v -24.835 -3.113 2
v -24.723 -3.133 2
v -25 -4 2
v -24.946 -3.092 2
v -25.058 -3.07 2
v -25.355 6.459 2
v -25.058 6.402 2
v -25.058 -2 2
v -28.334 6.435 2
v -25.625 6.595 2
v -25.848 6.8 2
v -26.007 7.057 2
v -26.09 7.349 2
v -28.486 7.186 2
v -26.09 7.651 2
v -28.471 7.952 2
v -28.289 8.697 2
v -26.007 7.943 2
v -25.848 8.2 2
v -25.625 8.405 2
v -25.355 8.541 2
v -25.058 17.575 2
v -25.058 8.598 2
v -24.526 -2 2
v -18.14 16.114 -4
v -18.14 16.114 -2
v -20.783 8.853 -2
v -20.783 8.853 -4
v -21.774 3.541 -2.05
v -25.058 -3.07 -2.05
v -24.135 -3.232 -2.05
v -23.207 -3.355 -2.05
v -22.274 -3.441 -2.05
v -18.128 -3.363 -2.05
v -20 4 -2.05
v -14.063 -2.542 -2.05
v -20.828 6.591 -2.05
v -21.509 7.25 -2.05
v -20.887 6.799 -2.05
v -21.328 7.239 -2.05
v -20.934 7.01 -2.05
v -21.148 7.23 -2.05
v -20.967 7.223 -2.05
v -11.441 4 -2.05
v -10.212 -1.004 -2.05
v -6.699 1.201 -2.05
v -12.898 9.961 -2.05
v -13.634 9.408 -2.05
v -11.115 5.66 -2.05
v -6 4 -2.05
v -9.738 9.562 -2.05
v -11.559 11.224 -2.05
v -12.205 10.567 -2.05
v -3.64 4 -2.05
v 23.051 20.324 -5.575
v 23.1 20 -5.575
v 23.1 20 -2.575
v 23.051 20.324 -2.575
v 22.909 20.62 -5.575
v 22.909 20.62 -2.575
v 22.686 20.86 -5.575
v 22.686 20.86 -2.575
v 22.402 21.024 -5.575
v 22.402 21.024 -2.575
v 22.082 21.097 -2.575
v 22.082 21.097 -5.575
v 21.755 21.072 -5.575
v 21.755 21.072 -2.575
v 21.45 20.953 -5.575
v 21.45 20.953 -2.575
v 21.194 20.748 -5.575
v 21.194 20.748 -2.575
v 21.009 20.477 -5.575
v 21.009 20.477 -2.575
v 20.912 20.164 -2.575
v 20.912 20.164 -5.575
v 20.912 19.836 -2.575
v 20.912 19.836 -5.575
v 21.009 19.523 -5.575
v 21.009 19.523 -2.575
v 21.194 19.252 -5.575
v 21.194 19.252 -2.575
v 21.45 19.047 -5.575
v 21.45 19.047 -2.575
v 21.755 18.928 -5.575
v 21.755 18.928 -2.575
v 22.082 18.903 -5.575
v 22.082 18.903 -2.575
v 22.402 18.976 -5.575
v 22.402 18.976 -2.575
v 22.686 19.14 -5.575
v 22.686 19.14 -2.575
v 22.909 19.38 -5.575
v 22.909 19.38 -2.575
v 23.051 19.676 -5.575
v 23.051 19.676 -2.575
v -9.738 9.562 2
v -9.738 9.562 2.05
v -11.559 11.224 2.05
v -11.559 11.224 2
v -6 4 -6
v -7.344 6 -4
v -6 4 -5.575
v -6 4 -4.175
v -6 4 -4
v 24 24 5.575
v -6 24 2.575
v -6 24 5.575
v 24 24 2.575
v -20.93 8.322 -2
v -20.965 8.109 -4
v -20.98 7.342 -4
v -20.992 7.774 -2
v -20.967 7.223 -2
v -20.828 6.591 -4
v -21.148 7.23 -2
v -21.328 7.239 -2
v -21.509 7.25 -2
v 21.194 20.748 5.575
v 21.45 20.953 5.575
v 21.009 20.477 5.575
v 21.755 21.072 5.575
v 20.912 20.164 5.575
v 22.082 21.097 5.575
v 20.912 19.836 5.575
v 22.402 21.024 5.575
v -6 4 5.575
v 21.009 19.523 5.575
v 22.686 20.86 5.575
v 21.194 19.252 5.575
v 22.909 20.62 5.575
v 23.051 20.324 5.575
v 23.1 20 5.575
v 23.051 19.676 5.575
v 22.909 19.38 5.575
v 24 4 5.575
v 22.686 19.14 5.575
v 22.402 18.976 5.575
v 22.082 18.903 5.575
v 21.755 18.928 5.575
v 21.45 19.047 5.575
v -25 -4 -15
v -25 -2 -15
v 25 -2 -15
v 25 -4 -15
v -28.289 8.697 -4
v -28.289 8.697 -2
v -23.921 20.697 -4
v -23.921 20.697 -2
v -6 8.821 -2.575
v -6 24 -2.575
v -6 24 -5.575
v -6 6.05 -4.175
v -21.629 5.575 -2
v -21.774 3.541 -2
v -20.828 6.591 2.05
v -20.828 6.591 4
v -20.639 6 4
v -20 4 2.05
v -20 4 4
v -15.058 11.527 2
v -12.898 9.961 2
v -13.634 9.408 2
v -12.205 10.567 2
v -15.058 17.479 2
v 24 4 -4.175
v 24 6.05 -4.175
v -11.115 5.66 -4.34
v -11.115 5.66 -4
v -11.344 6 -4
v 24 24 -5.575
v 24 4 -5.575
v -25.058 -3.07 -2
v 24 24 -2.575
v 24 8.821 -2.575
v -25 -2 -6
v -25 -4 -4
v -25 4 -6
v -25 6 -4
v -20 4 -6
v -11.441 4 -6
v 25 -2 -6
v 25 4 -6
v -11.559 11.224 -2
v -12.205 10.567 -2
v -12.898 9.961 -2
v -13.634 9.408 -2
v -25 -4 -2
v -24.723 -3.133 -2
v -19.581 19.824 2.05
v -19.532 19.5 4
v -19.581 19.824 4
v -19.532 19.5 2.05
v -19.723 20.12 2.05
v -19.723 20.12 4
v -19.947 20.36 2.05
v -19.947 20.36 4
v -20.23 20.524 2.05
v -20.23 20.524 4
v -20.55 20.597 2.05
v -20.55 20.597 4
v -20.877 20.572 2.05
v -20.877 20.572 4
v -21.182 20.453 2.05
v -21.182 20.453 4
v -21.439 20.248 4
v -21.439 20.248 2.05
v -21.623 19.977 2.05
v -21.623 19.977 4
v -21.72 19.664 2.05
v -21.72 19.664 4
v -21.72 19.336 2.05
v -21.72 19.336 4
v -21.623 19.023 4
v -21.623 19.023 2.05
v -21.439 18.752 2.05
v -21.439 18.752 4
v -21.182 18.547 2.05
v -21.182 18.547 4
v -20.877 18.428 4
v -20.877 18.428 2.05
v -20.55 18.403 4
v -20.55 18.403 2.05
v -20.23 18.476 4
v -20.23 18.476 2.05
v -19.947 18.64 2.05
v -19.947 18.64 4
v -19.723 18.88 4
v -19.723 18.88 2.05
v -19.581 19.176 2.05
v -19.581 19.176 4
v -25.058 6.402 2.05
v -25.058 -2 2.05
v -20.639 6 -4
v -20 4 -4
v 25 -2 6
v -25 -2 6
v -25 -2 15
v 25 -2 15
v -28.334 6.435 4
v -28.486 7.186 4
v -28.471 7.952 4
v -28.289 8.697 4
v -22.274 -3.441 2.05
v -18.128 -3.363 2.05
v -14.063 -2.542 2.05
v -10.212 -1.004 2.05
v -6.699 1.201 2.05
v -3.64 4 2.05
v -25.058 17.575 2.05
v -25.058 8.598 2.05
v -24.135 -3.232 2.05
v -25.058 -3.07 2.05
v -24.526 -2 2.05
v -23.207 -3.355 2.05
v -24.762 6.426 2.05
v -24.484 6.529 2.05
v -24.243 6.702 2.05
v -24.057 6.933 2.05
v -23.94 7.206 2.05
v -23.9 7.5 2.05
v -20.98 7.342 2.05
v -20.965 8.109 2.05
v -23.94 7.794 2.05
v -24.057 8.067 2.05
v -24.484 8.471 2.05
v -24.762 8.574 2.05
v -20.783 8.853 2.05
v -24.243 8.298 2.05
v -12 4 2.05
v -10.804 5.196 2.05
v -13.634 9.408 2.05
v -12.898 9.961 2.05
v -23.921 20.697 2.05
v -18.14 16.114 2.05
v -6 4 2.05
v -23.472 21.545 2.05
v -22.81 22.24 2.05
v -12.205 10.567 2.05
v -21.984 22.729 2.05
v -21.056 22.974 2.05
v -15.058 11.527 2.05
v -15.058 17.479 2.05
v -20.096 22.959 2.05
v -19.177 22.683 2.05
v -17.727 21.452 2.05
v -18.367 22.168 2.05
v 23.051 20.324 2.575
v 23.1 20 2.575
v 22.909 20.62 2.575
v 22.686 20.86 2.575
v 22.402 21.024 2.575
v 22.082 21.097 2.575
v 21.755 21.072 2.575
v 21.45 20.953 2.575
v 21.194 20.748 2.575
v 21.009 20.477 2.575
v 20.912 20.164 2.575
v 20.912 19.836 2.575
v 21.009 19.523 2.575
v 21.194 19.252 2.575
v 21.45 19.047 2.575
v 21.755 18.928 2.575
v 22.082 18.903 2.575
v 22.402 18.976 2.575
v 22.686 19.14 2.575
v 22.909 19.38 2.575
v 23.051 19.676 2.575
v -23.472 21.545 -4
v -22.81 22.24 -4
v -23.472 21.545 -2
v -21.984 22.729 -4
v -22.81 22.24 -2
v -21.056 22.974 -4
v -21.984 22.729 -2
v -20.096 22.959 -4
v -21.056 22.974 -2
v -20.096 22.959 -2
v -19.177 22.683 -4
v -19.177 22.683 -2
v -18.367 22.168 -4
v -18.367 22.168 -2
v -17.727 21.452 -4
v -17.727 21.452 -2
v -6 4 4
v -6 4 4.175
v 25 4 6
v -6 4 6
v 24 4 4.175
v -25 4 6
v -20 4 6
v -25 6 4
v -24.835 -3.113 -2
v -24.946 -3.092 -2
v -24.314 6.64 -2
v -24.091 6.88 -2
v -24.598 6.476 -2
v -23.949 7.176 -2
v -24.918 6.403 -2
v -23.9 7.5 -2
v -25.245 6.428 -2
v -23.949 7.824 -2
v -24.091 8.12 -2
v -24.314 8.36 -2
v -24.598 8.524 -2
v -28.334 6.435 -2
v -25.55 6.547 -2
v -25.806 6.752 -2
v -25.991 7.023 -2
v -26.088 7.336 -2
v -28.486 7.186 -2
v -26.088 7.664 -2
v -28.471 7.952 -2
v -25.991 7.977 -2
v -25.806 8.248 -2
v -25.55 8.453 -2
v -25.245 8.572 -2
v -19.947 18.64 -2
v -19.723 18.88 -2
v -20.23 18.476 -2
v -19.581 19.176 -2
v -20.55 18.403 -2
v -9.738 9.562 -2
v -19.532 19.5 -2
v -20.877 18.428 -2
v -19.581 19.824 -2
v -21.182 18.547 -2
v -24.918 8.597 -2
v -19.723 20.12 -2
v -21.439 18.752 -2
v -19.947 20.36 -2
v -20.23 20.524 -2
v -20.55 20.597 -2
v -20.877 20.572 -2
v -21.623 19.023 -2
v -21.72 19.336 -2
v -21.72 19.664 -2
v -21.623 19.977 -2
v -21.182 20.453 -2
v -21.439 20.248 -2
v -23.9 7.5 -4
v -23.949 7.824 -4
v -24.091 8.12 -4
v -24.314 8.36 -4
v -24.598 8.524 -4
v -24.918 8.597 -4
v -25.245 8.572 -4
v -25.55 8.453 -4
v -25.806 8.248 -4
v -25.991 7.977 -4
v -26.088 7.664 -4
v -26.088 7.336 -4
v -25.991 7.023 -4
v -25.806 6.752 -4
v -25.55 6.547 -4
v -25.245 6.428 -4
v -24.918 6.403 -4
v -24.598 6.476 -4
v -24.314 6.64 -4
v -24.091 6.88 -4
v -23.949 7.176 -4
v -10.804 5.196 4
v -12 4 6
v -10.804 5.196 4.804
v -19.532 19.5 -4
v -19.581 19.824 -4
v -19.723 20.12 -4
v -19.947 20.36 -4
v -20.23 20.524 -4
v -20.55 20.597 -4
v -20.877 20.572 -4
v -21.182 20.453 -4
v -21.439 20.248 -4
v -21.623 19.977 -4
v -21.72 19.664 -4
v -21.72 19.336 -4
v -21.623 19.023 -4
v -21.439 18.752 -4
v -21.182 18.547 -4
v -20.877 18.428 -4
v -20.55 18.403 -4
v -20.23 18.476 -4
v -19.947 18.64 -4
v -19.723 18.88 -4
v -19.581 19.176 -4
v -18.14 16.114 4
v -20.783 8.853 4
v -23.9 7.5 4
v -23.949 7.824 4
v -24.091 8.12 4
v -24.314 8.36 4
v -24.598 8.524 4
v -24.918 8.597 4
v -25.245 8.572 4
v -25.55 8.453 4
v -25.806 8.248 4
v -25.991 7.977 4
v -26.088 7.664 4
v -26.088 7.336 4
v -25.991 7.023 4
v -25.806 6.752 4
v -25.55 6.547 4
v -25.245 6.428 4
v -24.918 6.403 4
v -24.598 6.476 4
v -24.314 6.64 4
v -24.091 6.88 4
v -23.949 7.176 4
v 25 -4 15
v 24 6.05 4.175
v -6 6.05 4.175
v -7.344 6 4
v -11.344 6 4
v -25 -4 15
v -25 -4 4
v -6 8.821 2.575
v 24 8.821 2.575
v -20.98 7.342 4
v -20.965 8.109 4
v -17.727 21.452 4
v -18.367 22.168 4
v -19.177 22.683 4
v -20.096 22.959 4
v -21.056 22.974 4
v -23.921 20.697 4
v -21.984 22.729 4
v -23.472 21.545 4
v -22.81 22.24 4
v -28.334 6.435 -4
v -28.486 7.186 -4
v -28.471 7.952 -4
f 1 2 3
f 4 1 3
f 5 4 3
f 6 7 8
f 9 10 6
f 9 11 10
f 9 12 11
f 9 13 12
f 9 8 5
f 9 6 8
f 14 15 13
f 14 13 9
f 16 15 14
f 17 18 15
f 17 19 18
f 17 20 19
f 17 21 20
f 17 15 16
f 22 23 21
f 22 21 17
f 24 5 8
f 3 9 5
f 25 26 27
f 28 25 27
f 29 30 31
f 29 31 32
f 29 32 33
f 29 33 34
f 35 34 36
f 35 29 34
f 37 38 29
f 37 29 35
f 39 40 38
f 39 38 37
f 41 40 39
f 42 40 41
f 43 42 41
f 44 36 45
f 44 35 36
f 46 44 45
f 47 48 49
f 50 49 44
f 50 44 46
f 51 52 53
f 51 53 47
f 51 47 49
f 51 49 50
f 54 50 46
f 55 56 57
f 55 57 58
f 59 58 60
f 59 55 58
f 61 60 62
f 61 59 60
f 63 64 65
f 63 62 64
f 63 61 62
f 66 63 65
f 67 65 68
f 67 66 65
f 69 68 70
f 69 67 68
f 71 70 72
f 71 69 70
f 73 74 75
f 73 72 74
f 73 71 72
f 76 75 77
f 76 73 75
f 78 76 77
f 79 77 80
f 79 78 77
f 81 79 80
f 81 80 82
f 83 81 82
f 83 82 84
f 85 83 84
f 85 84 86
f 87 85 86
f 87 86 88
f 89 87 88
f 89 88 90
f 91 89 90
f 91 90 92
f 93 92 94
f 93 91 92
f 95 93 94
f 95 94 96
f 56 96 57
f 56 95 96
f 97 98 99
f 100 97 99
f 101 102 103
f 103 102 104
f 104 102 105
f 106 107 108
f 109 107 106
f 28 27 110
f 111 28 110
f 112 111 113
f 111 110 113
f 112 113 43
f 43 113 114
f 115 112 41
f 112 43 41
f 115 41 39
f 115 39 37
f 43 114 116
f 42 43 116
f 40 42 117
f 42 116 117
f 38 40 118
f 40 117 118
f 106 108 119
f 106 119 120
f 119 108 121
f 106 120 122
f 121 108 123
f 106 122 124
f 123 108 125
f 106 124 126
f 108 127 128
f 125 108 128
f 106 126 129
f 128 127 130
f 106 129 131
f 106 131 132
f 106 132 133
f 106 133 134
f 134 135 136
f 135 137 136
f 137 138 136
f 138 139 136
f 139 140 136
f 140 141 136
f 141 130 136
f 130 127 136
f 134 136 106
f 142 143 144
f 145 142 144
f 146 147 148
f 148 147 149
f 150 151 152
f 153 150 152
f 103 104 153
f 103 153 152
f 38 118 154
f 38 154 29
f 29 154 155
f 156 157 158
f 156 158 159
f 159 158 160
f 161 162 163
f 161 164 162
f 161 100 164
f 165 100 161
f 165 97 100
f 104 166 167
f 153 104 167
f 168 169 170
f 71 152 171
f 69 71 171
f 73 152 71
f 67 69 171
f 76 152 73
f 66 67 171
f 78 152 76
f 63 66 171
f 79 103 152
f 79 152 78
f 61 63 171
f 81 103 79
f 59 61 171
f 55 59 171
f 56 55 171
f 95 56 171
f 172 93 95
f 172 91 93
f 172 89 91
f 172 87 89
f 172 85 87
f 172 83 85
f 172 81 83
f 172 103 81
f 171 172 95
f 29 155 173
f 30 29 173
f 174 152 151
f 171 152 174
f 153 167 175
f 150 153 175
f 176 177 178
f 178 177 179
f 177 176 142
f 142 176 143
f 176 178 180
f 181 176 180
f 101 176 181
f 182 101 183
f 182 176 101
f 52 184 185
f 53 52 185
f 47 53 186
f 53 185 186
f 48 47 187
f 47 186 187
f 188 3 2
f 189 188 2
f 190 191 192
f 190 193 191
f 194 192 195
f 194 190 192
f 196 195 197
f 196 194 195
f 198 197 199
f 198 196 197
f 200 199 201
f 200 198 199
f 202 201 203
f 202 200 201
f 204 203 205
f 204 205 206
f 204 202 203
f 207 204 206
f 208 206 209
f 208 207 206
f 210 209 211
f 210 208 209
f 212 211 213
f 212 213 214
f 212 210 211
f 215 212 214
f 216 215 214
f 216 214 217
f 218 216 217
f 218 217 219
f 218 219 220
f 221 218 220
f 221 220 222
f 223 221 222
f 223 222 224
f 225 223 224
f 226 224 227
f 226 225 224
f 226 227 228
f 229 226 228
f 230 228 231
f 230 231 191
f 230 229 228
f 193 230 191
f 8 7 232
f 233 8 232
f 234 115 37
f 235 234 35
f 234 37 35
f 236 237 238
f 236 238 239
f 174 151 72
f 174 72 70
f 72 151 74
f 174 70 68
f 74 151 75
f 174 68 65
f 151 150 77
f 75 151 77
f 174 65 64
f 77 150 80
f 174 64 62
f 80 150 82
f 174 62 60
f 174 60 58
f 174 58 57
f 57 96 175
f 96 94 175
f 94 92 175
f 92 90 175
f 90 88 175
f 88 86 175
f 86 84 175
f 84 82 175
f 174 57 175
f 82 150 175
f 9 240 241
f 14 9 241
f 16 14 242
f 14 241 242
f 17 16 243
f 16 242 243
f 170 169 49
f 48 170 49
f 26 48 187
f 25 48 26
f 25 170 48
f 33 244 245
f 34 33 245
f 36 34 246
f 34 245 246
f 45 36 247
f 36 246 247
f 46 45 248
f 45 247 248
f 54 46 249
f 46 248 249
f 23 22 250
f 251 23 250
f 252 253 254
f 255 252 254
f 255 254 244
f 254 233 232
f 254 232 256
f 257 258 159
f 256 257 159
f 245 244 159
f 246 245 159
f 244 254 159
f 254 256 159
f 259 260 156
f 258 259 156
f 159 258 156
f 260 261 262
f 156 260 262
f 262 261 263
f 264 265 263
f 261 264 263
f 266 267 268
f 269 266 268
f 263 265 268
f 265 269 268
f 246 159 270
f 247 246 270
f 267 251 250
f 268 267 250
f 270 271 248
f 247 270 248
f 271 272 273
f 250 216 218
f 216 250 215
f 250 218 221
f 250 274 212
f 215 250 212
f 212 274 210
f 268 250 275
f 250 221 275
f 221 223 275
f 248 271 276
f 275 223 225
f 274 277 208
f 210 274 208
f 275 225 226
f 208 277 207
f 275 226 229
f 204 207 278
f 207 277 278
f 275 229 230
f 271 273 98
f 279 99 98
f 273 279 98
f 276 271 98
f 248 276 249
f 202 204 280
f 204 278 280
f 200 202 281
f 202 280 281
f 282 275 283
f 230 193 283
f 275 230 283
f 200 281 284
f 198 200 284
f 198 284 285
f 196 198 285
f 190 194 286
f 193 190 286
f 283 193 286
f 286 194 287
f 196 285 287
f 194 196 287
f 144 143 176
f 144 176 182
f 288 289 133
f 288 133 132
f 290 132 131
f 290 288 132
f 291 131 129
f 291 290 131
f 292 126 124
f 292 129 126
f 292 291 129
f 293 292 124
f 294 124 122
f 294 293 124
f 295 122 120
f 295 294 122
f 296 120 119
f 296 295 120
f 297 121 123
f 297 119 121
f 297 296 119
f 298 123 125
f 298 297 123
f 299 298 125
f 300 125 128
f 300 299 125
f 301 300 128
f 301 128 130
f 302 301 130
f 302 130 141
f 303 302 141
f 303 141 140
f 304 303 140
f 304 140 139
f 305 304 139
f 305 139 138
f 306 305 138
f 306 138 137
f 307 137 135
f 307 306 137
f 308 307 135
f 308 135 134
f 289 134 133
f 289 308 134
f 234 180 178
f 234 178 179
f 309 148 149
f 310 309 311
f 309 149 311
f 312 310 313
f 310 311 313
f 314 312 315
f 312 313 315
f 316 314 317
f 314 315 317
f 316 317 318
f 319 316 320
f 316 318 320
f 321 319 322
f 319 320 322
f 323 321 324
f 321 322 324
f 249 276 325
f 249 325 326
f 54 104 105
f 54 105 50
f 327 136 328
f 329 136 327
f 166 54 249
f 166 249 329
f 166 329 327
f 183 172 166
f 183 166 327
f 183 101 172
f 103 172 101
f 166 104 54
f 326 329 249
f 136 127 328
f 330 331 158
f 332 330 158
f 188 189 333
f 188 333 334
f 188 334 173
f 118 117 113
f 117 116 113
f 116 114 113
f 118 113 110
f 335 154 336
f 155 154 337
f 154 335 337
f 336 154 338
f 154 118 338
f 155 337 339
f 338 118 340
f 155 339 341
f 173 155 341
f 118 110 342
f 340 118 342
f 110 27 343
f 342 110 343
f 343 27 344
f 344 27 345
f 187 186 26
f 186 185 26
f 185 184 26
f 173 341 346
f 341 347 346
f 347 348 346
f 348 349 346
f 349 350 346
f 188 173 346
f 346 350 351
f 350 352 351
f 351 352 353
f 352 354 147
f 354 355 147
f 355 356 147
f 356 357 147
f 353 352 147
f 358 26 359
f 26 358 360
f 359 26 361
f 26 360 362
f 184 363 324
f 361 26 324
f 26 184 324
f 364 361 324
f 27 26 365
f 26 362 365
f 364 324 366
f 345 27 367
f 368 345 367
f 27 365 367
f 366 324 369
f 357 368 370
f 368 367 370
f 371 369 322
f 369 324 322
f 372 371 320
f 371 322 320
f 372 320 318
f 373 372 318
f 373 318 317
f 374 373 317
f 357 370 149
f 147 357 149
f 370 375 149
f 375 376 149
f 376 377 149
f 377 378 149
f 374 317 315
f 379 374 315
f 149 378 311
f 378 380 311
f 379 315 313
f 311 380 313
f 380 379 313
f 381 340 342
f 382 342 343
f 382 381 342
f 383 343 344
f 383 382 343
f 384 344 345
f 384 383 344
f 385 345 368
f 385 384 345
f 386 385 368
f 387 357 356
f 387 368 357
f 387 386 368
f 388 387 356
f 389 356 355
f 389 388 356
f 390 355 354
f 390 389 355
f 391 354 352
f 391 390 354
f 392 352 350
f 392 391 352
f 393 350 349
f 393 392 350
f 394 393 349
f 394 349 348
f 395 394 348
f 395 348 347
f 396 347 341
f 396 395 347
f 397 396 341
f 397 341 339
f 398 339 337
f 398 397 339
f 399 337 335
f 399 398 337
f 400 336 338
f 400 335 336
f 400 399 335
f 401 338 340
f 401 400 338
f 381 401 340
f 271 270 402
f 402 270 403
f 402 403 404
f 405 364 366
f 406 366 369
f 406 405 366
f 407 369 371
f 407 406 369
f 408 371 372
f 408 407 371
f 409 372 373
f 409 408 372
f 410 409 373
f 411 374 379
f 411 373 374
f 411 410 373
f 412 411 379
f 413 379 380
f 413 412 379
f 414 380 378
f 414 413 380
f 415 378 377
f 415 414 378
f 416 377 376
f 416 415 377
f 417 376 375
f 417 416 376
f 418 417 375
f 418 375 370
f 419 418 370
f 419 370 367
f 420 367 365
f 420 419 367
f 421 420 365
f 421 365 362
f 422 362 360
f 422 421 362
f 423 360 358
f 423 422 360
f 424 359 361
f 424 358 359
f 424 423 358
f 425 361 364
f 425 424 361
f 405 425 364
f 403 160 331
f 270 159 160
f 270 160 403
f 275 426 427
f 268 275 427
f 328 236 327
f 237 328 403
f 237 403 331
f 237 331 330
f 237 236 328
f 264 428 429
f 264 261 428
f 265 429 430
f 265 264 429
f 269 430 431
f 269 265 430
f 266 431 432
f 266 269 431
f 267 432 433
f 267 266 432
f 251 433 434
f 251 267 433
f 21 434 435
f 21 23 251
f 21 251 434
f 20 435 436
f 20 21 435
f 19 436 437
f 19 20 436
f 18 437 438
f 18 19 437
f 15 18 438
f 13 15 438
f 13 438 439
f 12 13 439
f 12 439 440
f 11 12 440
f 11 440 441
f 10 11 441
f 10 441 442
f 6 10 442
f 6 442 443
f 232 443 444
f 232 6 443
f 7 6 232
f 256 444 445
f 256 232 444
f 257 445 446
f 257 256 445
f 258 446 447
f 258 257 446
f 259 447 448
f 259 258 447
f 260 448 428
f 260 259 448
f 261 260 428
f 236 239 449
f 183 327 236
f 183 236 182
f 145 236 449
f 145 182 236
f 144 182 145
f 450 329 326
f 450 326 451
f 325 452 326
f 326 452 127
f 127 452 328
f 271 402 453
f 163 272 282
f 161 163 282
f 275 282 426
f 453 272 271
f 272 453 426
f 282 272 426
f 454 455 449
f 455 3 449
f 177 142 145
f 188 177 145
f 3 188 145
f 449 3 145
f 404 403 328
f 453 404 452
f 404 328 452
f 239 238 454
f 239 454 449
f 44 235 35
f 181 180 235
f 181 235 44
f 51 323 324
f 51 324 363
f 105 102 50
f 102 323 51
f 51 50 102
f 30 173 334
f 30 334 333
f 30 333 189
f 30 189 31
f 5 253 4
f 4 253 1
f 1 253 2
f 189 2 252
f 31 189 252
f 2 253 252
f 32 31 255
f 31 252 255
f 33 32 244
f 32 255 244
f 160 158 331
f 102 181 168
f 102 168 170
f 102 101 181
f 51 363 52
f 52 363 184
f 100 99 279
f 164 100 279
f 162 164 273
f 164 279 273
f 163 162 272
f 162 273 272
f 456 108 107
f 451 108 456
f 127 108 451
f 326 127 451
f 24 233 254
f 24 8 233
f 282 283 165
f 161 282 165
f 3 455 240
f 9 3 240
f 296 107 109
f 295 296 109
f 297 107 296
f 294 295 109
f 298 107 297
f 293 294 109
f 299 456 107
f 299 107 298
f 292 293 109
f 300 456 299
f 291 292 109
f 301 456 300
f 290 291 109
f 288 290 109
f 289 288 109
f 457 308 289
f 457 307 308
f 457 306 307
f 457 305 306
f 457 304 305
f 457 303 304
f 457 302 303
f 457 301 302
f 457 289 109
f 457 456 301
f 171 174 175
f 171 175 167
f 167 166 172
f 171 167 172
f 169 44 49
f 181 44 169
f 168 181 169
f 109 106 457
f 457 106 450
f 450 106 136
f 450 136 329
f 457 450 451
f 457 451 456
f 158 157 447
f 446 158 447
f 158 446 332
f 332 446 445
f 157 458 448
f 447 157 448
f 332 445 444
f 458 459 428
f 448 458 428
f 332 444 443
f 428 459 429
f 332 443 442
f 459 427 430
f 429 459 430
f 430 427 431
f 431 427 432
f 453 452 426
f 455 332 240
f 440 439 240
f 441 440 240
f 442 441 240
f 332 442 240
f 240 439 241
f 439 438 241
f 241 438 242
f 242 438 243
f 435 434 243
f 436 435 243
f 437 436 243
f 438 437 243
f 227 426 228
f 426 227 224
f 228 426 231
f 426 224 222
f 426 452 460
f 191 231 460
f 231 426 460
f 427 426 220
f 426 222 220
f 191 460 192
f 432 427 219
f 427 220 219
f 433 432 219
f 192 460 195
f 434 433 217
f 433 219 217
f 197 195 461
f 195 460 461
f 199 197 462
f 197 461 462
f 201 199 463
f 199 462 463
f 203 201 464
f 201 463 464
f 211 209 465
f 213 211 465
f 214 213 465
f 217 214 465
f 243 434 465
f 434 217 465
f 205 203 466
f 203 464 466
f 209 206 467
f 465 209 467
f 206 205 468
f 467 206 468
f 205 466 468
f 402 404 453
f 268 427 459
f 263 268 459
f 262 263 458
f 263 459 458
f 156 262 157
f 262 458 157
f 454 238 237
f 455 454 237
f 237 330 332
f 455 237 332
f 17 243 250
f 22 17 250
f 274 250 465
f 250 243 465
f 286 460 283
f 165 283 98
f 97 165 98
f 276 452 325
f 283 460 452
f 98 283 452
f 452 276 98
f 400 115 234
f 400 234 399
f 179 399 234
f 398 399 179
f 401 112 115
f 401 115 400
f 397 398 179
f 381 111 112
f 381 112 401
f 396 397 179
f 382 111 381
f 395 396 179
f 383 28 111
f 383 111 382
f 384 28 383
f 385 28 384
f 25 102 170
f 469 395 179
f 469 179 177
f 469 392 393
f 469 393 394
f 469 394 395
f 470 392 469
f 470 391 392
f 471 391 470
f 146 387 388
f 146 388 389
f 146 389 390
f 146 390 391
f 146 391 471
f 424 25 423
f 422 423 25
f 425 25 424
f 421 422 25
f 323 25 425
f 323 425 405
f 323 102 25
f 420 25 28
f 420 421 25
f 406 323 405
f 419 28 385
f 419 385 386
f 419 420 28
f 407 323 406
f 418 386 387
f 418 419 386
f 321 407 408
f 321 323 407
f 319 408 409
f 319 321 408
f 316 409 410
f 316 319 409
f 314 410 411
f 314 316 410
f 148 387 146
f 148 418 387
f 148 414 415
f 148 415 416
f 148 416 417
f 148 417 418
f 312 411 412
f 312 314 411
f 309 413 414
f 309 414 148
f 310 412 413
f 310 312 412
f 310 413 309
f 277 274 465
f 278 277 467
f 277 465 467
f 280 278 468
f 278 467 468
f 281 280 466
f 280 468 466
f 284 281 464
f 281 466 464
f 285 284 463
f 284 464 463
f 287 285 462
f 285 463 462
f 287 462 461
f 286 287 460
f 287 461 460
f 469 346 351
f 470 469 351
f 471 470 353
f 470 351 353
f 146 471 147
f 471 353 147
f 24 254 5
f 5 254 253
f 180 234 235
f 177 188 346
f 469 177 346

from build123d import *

# Parameters (mm, degrees)
SKETCH_1_W               = 50
SKETCH_1_H               = 30
EXTRUDE_1_DEPTH          = 4
SKETCH_2_R               = 1.1
EXTRUDE_2_DEPTH          = 4
CUT_EXTRUDE_1_DEPTH      = 2
EXTRUDE_3_DEPTH          = 2
CUT_EXTRUDE_3_DEPTH      = 2.05
SKETCH_7_W               = 30
SKETCH_7_H               = 3
EXTRUDE_4_DEPTH          = 20
FILLET_3_R               = 2
CUT_EXTRUDE_5_DEPTH      = 38.911080175
CUT_EXTRUDE_5_DEPTH_BACK = 6
SKETCH_9_W               = 10
SKETCH_9_H               = 2
CUT_EXTRUDE_6_DEPTH      = 30
CUT_EXTRUDE_7_DEPTH      = 41.165283517
CUT_EXTRUDE_7_DEPTH_BACK = 41.165283517
SKETCH_11_R              = 1.1


with BuildPart() as part:
    # 草图1 → 凸台-拉伸1 (new, symmetric)
    with BuildSketch(Plane(origin=(0, 0, 0), x_dir=(1, 0, 0), z_dir=(0, 1, 0))):
        Rectangle(SKETCH_1_W, SKETCH_1_H)
    extrude(amount=EXTRUDE_1_DEPTH, both=True)

    # 草图2 → 凸台-拉伸2 (add, symmetric)
    with BuildSketch(Plane.XY):
        with BuildLine():
            Line((-25, -4), (-28.333963394, 6.434782609))
            ThreePointArc((-28.333963394, 6.434782609), (-28.499306582, 7.56966666), (-28.288924173, 8.697070502))
            Line((-28.288924173, 8.697070502), (-23.921281362, 20.697070502))
            ThreePointArc((-23.921281362, 20.697070502), (-19.435286687, 22.788924173), (-17.343433016, 18.302929498))
            Line((-17.343433016, 18.302929498), (-20.782808769, 8.853322281))
            ThreePointArc((-20.782808769, 8.853322281), (-20.993191178, 7.72591844), (-20.827847989, 6.591034388))
            Line((-20.827847989, 6.591034388), (-20, 4))
            Line((-20, 4), (-25, -4))
        make_face()
        with Locations((-25, 7.5)):
            Circle(SKETCH_2_R, mode=Mode.SUBTRACT)
        with Locations((-20.632357189, 19.5)):
            Circle(SKETCH_2_R, mode=Mode.SUBTRACT)
    extrude(amount=EXTRUDE_2_DEPTH, both=True)

    # 草图3 → 切除-拉伸1 (cut, symmetric)
    with BuildSketch(Plane.XY):
        with BuildLine():
            ThreePointArc((-28.288924173, 8.697070502), (-28.499306582, 7.56966666), (-28.333963394, 6.434782609))
            Line((-28.333963394, 6.434782609), (-25, -4))
            Line((-25, -4), (-21.711075827, 6.302929498))
            Line((-21.711075827, 6.302929498), (-20.537616571, 5.928335213))
            Line((-20.537616571, 5.928335213), (-20.782808769, 8.853322281))
            Line((-20.782808769, 8.853322281), (-17.343433016, 18.302929498))
            ThreePointArc((-17.343433016, 18.302929498), (-19.435286687, 22.788924173), (-23.921281362, 20.697070502))
            Line((-23.921281362, 20.697070502), (-28.288924173, 8.697070502))
        make_face()
    extrude(amount=CUT_EXTRUDE_1_DEPTH, both=True, mode=Mode.SUBTRACT)

    # 草图4 → 凸台-拉伸3 (add)
    with BuildSketch(Plane.XY.offset(4)):
        Polygon((-17.727312988, 21.45210609), (-6, 4), (-10, 4), (-18.140180759, 16.113883065), align=None)
    extrude_3 = extrude(amount=-EXTRUDE_3_DEPTH)

    # 镜向1: 凸台-拉伸3 across plane
    add(extrude_3.mirror(Plane.XY))

    # 草图6 → 切除-拉伸3 (cut, symmetric)
    with BuildSketch(Plane.XY):
        with BuildLine():
            Line((-21.508926635, 7.250186543), (-22.273988478, -3.441339253))
            ThreePointArc((-22.273988478, -3.441339253), (-12.102598016, -1.859850385), (-3.639711721, 4))
            Line((-3.639711721, 4), (-11.558922773, 11.223582198))
            ThreePointArc((-11.558922773, 11.223582198), (-16.077786178, 8.094642196), (-21.508926635, 7.250186543))
        make_face()
        with BuildLine():
            Line((-22.273988478, -3.441339253), (-21.774361564, 3.540807476))
            Line((-21.774361564, 3.540807476), (-25.057597959, -3.070273462))
            ThreePointArc((-25.057597959, -3.070273462), (-23.671461761, -3.298329838), (-22.273988478, -3.441339253))
        make_face()
    extrude(amount=CUT_EXTRUDE_3_DEPTH, both=True, mode=Mode.SUBTRACT)

    # 草图7 → 凸台-拉伸4 (add)
    with BuildSketch(Plane(origin=(0, 4, 0), x_dir=(1, 0, 0), z_dir=(0, 1, 0))):
        with Locations((9, -4.075)):
            Rectangle(SKETCH_7_W, SKETCH_7_H)
        with Locations((9, 4.075)):
            Rectangle(SKETCH_7_W, SKETCH_7_H)
    extrude(amount=EXTRUDE_4_DEPTH)

    # 圆角3
    # the kernel refuses this fillet: 2 mm, written as the material it takes off along each edge
    with BuildSketch(Plane(origin=(-21.579710991, 6.260994922, 2), x_dir=(-0.07137527342969462, -0.9974495327297699, 0), z_dir=(0, 0, -1))) as fillet_3_piece_1:
        with BuildLine():
            CenterArc((0.687360644, 2), FILLET_3_R, 248.905574678, 21.094425322)
            Line((-0.032451423, 0.134022886), (-0.046847664, 0.096703344))
            ThreePointArc((-0.046847664, 0.096703344), (-0.055102303, 0.05759812), (-0.038876591, -0.009413323))
            Line((-0.038876591, -0.009413323), (0, -0.04))
            Line((0, -0.04), (0.687360644, -0.04))
            Line((0.687360644, -0.04), (0.687360644, 0))
        make_face()
    extrude(amount=4, mode=Mode.SUBTRACT)

    # 倒角2
    # the kernel refuses this chamfer: 2, 1.441174265 mm, written as the material it adds along each edge
    with BuildSketch(Plane(origin=(-6, 4, -4), x_dir=(0, -0.02749587661058627, -0.9996219169112968), z_dir=(-1, 0, 0))) as chamfer_2_piece_1_section:
        with BuildLine():
            Line((2.05734639, 0), (-0.11309431, -2.054235587))
            Line((-0.11309431, -2.054235587), (-0.153079186, -2.053135752))
            ThreePointArc((-0.153079186, -2.053135752), (-0.068258454, -1.026795659), (-0.039984877, 0.001099835))
            Line((-0.039984877, 0.001099835), (0.001099835, 0.039984877))
            ThreePointArc((0.001099835, 0.039984877), (1.028995329, 0.011711299), (2.058446225, 0.039984877))
            Line((2.058446225, 0.039984877), (2.05734639, 0))
        make_face()
    chamfer_2_piece_1 = extrude(amount=9.143365976, mode=Mode.PRIVATE)
    chamfer_2_piece_1 = split(chamfer_2_piece_1, bisect_by=Plane(origin=(-7.065617909, 5.585808856, -4.659423843), z_dir=(-0.8300126289410857, -0.5577445972829389, 0)), keep=Keep.TOP, mode=Mode.PRIVATE)
    chamfer_2_piece_1 = split(chamfer_2_piece_1, bisect_by=Plane(origin=(-9.821301765, 3.734068618, -4.659423843), z_dir=(0.8300126289410859, 0.5577445972829388, 0)), keep=Keep.TOP, mode=Mode.PRIVATE)
    add(chamfer_2_piece_1)
    with BuildSketch(Plane(origin=(-25, 4, 4), x_dir=(0, -0.02749587661058627, 0.9996219169112968), z_dir=(1, 0, 0))) as chamfer_2_piece_2_section:
        with BuildLine():
            Line((2.05734639, 0), (-0.11309431, -2.054235587))
            Line((-0.11309431, -2.054235587), (-0.153079186, -2.053135752))
            ThreePointArc((-0.153079186, -2.053135752), (-0.068258454, -1.026795659), (-0.039984877, 0.001099835))
            Line((-0.039984877, 0.001099835), (0.001099835, 0.039984877))
            ThreePointArc((0.001099835, 0.039984877), (1.028995329, 0.011711299), (2.058446225, 0.039984877))
            Line((2.058446225, 0.039984877), (2.05734639, 0))
        make_face()
    chamfer_2_piece_2 = extrude(amount=10.143365976, mode=Mode.PRIVATE)
    chamfer_2_piece_2 = split(chamfer_2_piece_2, bisect_by=Plane(origin=(-20.42738659, 5.337653005, 4.668646513), z_dir=(-0.9525609695742022, -0.30434782608695565, 0)), keep=Keep.TOP, mode=Mode.PRIVATE)
    add(chamfer_2_piece_2)
    with BuildSketch(Plane(origin=(-25, 4, -4), x_dir=(0, -0.02749587661058627, -0.9996219169112968), z_dir=(1, 0, 0))) as chamfer_2_piece_3_section:
        with BuildLine():
            Line((2.05734639, 0), (-0.11309431, 2.054235587))
            Line((-0.11309431, 2.054235587), (-0.153079186, 2.053135752))
            ThreePointArc((-0.153079186, 2.053135752), (-0.068258454, 1.026795659), (-0.039984877, -0.001099835))
            Line((-0.039984877, -0.001099835), (0.001099835, -0.039984877))
            ThreePointArc((0.001099835, -0.039984877), (1.028995329, -0.011711299), (2.058446225, -0.039984877))
            Line((2.058446225, -0.039984877), (2.05734639, 0))
        make_face()
    chamfer_2_piece_3 = extrude(amount=10.143365976, mode=Mode.PRIVATE)
    chamfer_2_piece_3 = split(chamfer_2_piece_3, bisect_by=Plane(origin=(-20.42738659, 5.337653005, -4.668646513), z_dir=(-0.9525609695742022, -0.30434782608695565, 0)), keep=Keep.TOP, mode=Mode.PRIVATE)
    add(chamfer_2_piece_3)
    with BuildSketch(Plane(origin=(-6, 4, 4), x_dir=(0, -0.02749587661058627, 0.9996219169112968), z_dir=(-1, 0, 0))) as chamfer_2_piece_4_section:
        with BuildLine():
            Line((2.05734639, 0), (-0.11309431, 2.054235587))
            Line((-0.11309431, 2.054235587), (-0.153079186, 2.053135752))
            ThreePointArc((-0.153079186, 2.053135752), (-0.068258454, 1.026795659), (-0.039984877, -0.001099835))
            Line((-0.039984877, -0.001099835), (0.001099835, -0.039984877))
            ThreePointArc((0.001099835, -0.039984877), (1.028995329, -0.011711299), (2.058446225, -0.039984877))
            Line((2.058446225, -0.039984877), (2.05734639, 0))
        make_face()
    chamfer_2_piece_4 = extrude(amount=9.143365976, mode=Mode.PRIVATE)
    chamfer_2_piece_4 = split(chamfer_2_piece_4, bisect_by=Plane(origin=(-9.821301765, 3.734068618, 4.659423843), z_dir=(0.8300126289410859, 0.5577445972829388, 0)), keep=Keep.TOP, mode=Mode.PRIVATE)
    chamfer_2_piece_4 = split(chamfer_2_piece_4, bisect_by=Plane(origin=(-7.065617909, 5.585808856, 4.659423843), z_dir=(-0.8300126289410857, -0.5577445972829389, 0)), keep=Keep.TOP, mode=Mode.PRIVATE)
    add(chamfer_2_piece_4)
    with BuildSketch(Plane(origin=(-10, 4, -4), x_dir=(-0.9985507752193709, -0.0538177415802029, 0), z_dir=(0, 0, 1))) as chamfer_2_piece_5:
        with BuildLine():
            Line((1.45869004, 0), (1.004929429, -1.795213361))
            Line((1.004929429, -1.795213361), (0.970576376, -1.815704037))
            ThreePointArc((0.970576376, -1.815704037), (0.492402938, -0.903608261), (-0.034353052, -0.020490676))
            Line((-0.034353052, -0.020490676), (0.00215271, 0.039942031))
            ThreePointArc((0.00215271, 0.039942031), (0.729385292, 0.000747214), (1.46084275, 0.039942031))
            Line((1.46084275, 0.039942031), (1.45869004, 0))
        make_face()
    extrude(amount=1.95)
    with BuildSketch(Plane(origin=(-10, 4, 4), x_dir=(-0.9996219169112968, -0.027495876610585623, 0), z_dir=(0, 0, -1))) as chamfer_2_piece_6:
        with BuildLine():
            Line((2.05734639, 0), (0.712510327, 1.272833716))
            Line((0.712510327, 1.272833716), (0.678708947, 1.294222188))
            ThreePointArc((0.678708947, 1.294222188), (0.355622826, 0.636816982), (-0.03380138, 0.021388472))
            Line((-0.03380138, 0.021388472), (0.001099835, -0.039984877))
            ThreePointArc((0.001099835, -0.039984877), (1.028995329, -0.011711299), (2.058446225, -0.039984877))
            Line((2.058446225, -0.039984877), (2.05734639, 0))
        make_face()
    extrude(amount=1.95)
    with BuildSketch(Plane(origin=(-10, 4, -9.143365976), x_dir=(-0.9985507752193707, -0.053817741580204116, 0), z_dir=(0, 0, 1))) as chamfer_2_piece_7a_section:
        with BuildLine():
            Line((1.45869004, 0), (1.004929429, -1.795213361))
            Line((1.004929429, -1.795213361), (0.970576376, -1.815704037))
            ThreePointArc((0.970576376, -1.815704037), (0.492402938, -0.903608261), (-0.034353052, -0.020490676))
            Line((-0.034353052, -0.020490676), (0.00215271, 0.039942031))
            ThreePointArc((0.00215271, 0.039942031), (0.729385292, 0.000747214), (1.46084275, 0.039942031))
            Line((1.46084275, 0.039942031), (1.45869004, 0))
        make_face()
    chamfer_2_piece_7a = extrude(amount=7.093365976, mode=Mode.PRIVATE)
    chamfer_2_piece_7a = split(chamfer_2_piece_7a, bisect_by=Plane(origin=(-10.840073323, 4.554425115, -4), z_dir=(0, 0, -1)), keep=Keep.TOP, mode=Mode.PRIVATE)
    with BuildSketch(Plane(origin=(-6, 4, -4), x_dir=(0, -0.02749587661058627, -0.9996219169112968), z_dir=(-1, 0, 0))) as chamfer_2_piece_7b_section:
        with BuildLine():
            Line((2.05734639, 0), (-0.11309431, -2.054235587))
            Line((-0.11309431, -2.054235587), (-0.153079186, -2.053135752))
            ThreePointArc((-0.153079186, -2.053135752), (-0.068258454, -1.026795659), (-0.039984877, 0.001099835))
            Line((-0.039984877, 0.001099835), (0.001099835, 0.039984877))
            ThreePointArc((0.001099835, 0.039984877), (1.028995329, 0.011711299), (2.058446225, 0.039984877))
            Line((2.058446225, 0.039984877), (2.05734639, 0))
        make_face()
    chamfer_2_piece_7b = extrude(amount=9.143365976, mode=Mode.PRIVATE)
    chamfer_2_piece_7b = split(chamfer_2_piece_7b, bisect_by=Plane(origin=(-11.153674237, 5.716850671, -4.67900162), z_dir=(-0.8300126289410859, -0.5577445972829388, 0)), keep=Keep.TOP, mode=Mode.PRIVATE)
    chamfer_2_piece_7 = chamfer_2_piece_7a & chamfer_2_piece_7b
    add(chamfer_2_piece_7)
    with BuildSketch(Plane(origin=(-6, 4, 4), x_dir=(0, -0.02749587661058627, 0.9996219169112968), z_dir=(-1, 0, 0))) as chamfer_2_piece_8a_section:
        with BuildLine():
            Line((2.05734639, 0), (-0.11309431, 2.054235587))
            Line((-0.11309431, 2.054235587), (-0.153079186, 2.053135752))
            ThreePointArc((-0.153079186, 2.053135752), (-0.068258454, 1.026795659), (-0.039984877, -0.001099835))
            Line((-0.039984877, -0.001099835), (0.001099835, -0.039984877))
            ThreePointArc((0.001099835, -0.039984877), (1.028995329, -0.011711299), (2.058446225, -0.039984877))
            Line((2.058446225, -0.039984877), (2.05734639, 0))
        make_face()
    chamfer_2_piece_8a = extrude(amount=9.143365976, mode=Mode.PRIVATE)
    chamfer_2_piece_8a = split(chamfer_2_piece_8a, bisect_by=Plane(origin=(-11.153674237, 5.716850671, 4.67900162), z_dir=(-0.8300126289410859, -0.5577445972829388, 0)), keep=Keep.TOP, mode=Mode.PRIVATE)
    with BuildSketch(Plane(origin=(-10, 4, 9.143365976), x_dir=(-0.9996219169112968, -0.027495876610586487, 0), z_dir=(0, 0, -1))) as chamfer_2_piece_8b_section:
        with BuildLine():
            Line((2.05734639, 0), (0.712510327, 1.272833716))
            Line((0.712510327, 1.272833716), (0.678708947, 1.294222188))
            ThreePointArc((0.678708947, 1.294222188), (0.355622826, 0.636816982), (-0.03380138, 0.021388472))
            Line((-0.03380138, 0.021388472), (0.001099835, -0.039984877))
            ThreePointArc((0.001099835, -0.039984877), (1.028995329, -0.011711299), (2.058446225, -0.039984877))
            Line((2.058446225, -0.039984877), (2.05734639, 0))
        make_face()
    chamfer_2_piece_8b = extrude(amount=7.093365976, mode=Mode.PRIVATE)
    chamfer_2_piece_8b = split(chamfer_2_piece_8b, bisect_by=Plane(origin=(-10.928726204, 4.388043855, 4), z_dir=(0, 0, 1)), keep=Keep.TOP, mode=Mode.PRIVATE)
    chamfer_2_piece_8 = chamfer_2_piece_8a & chamfer_2_piece_8b
    add(chamfer_2_piece_8)

    # 草图9 → 切除-拉伸5 (cut, two sides: drawn at the far end of the back side and taken through both)
    with BuildSketch(Plane(origin=(0, 4, 0), x_dir=(1, 0, 0), z_dir=(0, 1, 0)).offset(-CUT_EXTRUDE_5_DEPTH_BACK)):
        Polygon((-15.057597959, -2.05), (-15.057597959, 0), (-25.057597959, 0), (-25.057597959, -2.05), (-20, -2.05), align=None)
        with Locations((-20.057597959, 1)):
            Rectangle(SKETCH_9_W, SKETCH_9_H)
        Polygon((25, 15), (-25, 15), (-25, 6), (-20, 6), (-11.441174265, 6), (-6, 6), (25, 6), align=None)
        Polygon((25, -15), (25, -6), (-6, -6), (-12, -6), (-20, -6), (-25, -6), (-25, -15), align=None)
    extrude(amount=CUT_EXTRUDE_5_DEPTH + CUT_EXTRUDE_5_DEPTH_BACK, mode=Mode.SUBTRACT)

    # 草图10 → 切除-拉伸6 (cut)
    with BuildSketch(Plane(origin=(24, 0, 0), x_dir=(0, 0, -1), z_dir=(1, 0, 0))):
        Polygon((-2.575, 4), (-4.175, 4), (-4.175, 6.05), (-2.575, 8.821281292), align=None)
        Polygon((4.175, 6.05), (2.575, 8.821281292), (2.575, 4), (4.175, 4), align=None)
    extrude(amount=-CUT_EXTRUDE_6_DEPTH, mode=Mode.SUBTRACT)

    # 草图11 → 切除-拉伸7 (cut, two sides: drawn at the far end of the back side and taken through both)
    with BuildSketch(Plane.XY.offset(-CUT_EXTRUDE_7_DEPTH_BACK)):
        with Locations((22, 20)):
            Circle(SKETCH_11_R)
    extrude(amount=CUT_EXTRUDE_7_DEPTH + CUT_EXTRUDE_7_DEPTH_BACK, mode=Mode.SUBTRACT)


solid = part.part
